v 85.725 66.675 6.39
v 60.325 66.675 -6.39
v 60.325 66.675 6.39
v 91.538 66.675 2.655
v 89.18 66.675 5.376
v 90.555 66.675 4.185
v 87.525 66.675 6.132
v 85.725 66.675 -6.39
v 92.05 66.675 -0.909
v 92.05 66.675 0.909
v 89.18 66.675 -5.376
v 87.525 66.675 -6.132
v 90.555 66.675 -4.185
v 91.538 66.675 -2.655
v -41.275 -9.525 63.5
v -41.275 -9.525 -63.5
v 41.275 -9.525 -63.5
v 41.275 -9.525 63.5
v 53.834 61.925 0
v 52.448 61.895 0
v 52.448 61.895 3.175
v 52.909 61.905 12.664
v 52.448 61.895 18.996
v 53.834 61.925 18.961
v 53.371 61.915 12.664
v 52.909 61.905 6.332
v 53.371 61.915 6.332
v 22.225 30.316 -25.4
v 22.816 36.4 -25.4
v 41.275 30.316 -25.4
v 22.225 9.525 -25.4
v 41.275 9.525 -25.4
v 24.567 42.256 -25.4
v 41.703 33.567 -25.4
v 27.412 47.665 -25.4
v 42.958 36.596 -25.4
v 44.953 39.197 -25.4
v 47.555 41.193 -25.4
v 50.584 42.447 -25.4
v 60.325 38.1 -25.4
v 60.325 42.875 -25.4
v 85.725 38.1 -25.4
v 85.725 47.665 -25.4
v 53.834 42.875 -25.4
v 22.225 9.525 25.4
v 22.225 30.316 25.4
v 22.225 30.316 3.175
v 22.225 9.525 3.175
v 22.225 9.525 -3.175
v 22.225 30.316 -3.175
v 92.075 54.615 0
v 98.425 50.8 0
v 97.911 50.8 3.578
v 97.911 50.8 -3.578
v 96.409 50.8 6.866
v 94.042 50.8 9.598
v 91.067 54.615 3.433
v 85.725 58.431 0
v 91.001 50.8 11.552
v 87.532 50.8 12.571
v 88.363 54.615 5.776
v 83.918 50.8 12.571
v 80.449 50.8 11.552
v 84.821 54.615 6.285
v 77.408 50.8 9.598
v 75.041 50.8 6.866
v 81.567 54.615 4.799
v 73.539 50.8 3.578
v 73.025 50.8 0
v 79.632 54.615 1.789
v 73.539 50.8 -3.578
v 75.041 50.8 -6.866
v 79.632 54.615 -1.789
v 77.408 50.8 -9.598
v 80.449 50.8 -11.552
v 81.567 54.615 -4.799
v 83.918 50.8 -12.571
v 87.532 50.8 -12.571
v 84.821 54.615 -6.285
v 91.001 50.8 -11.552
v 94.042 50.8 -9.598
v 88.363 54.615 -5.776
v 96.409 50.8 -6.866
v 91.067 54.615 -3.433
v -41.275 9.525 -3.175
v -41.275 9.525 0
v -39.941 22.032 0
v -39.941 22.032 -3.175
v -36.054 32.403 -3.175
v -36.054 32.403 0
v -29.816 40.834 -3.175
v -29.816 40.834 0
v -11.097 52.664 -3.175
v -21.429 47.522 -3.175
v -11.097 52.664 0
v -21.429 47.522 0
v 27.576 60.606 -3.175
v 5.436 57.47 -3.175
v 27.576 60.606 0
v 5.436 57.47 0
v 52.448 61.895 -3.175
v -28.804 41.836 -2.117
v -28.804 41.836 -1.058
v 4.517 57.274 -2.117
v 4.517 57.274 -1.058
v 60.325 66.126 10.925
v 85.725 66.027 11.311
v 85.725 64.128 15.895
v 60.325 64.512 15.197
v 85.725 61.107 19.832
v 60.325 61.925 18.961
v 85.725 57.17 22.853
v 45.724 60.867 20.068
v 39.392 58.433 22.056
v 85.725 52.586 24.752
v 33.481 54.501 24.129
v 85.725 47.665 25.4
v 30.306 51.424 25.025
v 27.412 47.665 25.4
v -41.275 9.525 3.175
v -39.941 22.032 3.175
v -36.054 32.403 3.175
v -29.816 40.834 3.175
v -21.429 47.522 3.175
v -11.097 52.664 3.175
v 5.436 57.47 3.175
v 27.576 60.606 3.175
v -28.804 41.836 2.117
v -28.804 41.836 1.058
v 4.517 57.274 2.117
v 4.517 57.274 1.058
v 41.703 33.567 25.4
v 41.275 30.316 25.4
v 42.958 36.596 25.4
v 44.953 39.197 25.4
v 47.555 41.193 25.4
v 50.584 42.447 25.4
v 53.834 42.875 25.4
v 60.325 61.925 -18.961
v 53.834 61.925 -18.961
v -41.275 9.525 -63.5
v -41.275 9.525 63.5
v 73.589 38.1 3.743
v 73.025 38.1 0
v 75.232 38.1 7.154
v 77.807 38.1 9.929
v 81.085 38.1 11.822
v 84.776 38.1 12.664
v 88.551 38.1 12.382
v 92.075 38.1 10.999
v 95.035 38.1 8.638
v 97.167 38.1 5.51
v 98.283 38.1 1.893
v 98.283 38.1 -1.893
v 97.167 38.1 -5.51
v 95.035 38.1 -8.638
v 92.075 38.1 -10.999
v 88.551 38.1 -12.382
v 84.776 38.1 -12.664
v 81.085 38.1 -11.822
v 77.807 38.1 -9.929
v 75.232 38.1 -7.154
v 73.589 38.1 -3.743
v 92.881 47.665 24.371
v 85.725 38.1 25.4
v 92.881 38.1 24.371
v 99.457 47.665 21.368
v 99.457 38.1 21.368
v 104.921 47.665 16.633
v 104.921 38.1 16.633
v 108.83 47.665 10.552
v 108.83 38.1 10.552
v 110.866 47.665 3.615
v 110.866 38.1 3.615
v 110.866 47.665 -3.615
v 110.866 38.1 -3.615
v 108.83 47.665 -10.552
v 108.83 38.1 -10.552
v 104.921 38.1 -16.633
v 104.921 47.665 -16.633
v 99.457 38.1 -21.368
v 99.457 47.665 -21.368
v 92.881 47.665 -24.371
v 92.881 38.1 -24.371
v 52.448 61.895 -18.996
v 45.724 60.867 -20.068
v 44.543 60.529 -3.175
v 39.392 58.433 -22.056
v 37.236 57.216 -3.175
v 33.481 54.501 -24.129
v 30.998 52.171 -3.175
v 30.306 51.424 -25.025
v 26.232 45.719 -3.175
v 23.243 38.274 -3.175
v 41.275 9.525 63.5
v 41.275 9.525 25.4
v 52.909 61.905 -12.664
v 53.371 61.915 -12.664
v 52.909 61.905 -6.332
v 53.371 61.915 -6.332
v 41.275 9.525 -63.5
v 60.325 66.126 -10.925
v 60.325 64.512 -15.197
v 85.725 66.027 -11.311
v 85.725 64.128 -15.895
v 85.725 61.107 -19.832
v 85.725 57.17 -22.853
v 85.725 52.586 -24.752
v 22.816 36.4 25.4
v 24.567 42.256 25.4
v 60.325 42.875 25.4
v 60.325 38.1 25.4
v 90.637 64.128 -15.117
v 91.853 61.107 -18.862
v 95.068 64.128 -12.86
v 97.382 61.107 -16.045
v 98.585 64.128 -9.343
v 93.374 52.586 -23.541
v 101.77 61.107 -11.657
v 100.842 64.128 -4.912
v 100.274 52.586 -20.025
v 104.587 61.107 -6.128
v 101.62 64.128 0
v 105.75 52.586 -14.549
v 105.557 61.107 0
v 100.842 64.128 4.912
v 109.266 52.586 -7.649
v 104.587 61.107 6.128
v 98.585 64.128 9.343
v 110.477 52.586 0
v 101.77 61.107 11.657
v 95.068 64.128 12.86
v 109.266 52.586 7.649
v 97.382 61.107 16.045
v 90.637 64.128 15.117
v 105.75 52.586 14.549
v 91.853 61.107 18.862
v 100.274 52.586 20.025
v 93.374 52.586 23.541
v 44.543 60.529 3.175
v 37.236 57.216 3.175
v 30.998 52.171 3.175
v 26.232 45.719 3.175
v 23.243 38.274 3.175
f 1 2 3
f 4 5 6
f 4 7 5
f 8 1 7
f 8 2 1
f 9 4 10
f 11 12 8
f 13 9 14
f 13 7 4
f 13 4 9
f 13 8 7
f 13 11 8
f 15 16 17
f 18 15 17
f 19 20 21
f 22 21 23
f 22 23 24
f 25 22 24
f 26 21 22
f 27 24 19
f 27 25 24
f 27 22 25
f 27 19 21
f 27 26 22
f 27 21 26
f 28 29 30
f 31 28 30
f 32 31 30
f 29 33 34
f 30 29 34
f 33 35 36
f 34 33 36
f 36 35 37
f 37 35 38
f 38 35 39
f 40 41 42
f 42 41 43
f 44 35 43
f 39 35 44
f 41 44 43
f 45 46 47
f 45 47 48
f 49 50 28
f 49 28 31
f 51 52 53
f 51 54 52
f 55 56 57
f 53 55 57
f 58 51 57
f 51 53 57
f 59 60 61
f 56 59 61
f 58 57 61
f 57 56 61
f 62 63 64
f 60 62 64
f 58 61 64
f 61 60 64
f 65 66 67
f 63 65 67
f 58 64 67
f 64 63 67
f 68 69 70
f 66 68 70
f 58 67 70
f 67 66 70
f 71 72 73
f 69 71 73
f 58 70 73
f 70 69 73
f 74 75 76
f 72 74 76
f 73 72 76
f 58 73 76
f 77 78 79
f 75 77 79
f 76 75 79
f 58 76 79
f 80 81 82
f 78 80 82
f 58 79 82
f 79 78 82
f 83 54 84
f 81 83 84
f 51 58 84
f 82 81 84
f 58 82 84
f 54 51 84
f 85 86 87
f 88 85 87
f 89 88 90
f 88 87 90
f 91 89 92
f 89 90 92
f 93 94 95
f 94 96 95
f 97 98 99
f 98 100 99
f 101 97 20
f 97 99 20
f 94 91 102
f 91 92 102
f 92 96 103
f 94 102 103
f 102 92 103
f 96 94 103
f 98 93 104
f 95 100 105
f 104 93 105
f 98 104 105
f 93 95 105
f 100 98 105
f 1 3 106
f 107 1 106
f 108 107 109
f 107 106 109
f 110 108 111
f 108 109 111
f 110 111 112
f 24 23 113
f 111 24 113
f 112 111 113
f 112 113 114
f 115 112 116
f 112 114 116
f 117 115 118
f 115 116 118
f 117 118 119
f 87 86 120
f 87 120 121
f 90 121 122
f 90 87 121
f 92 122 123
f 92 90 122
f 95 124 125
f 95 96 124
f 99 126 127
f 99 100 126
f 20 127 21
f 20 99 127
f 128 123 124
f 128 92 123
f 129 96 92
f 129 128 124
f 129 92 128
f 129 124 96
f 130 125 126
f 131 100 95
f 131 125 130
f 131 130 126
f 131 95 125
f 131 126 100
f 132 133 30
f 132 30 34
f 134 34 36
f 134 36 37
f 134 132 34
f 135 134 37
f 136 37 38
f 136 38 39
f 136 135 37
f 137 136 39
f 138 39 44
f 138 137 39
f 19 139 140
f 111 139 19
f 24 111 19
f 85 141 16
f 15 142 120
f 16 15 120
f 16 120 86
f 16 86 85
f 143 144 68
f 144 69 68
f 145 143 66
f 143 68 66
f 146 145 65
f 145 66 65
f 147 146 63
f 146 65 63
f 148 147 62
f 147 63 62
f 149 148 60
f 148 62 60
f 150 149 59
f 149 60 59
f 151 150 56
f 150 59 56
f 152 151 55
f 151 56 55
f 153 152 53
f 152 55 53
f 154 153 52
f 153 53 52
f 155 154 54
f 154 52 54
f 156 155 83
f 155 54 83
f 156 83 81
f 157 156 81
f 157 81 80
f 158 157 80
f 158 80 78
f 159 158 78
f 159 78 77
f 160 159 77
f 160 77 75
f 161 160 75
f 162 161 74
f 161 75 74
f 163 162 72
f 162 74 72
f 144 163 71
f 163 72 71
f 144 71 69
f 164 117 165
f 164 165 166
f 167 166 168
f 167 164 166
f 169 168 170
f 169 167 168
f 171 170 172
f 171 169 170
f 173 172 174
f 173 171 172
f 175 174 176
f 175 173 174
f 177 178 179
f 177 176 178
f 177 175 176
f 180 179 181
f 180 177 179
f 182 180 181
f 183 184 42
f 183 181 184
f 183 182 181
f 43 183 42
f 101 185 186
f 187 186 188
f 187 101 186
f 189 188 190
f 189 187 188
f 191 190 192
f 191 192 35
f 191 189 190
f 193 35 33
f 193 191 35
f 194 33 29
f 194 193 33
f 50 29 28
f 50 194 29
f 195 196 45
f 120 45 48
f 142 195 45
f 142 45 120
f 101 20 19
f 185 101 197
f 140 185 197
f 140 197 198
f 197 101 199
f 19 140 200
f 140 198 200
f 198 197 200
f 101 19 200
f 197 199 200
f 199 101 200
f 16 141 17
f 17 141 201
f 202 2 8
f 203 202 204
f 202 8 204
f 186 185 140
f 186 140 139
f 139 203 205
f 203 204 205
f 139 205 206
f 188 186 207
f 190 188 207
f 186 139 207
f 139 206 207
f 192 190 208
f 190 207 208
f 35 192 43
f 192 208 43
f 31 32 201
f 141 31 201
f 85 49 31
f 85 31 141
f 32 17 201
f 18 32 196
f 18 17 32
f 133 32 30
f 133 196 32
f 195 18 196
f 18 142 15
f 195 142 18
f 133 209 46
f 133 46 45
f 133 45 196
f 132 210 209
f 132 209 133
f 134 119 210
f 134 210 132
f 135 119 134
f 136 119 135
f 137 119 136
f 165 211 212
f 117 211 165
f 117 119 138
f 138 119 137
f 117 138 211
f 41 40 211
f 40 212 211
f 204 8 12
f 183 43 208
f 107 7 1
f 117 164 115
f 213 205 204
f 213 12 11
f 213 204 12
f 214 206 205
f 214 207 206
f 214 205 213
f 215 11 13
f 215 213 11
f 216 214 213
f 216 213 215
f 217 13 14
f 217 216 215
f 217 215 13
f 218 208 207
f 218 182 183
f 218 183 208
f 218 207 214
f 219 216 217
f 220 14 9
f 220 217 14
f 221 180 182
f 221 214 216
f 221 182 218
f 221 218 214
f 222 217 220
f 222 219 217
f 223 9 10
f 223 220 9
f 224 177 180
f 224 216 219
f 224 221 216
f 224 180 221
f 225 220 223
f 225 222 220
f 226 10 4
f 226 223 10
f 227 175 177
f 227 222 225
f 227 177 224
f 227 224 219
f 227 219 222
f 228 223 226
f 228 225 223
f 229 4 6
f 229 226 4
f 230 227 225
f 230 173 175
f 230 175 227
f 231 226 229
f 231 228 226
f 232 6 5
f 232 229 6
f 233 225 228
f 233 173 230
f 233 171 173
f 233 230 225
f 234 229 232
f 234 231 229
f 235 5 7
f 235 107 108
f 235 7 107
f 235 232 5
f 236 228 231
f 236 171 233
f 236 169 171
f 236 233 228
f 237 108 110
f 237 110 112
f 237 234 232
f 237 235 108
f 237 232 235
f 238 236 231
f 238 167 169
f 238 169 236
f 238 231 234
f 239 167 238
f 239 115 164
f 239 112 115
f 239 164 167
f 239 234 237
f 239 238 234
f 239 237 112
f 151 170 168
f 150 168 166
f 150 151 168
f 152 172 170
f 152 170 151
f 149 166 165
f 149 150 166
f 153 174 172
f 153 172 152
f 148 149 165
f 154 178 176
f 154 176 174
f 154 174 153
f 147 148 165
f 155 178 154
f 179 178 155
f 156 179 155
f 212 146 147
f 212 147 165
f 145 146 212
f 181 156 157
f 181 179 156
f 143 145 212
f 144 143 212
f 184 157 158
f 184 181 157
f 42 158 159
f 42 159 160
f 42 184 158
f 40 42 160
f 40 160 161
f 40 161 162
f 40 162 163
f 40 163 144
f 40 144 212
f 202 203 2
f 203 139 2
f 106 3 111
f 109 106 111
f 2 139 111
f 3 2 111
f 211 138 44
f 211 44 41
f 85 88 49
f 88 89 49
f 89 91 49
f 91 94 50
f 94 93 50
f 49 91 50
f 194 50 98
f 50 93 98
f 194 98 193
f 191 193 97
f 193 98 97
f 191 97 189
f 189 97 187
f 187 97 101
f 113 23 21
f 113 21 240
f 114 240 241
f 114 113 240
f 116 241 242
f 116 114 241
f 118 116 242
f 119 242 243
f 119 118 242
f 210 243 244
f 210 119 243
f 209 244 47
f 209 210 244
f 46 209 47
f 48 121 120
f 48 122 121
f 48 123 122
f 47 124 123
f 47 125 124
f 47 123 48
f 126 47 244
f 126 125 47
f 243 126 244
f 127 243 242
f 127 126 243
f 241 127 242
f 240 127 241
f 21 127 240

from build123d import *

# Parameters (mm, degrees)
F1_DEPTH = 63.5
F0_W     = 25.4
F0_H     = 19.05
F0_H_2   = 4.7498
F0_H_3   = 4.7752
F2_DEPTH = 25.4
F3_DEPTH = 3.175
F5_R     = 19.0095175901
F7_D     = 25.4
F7_DEPTH = 12.7
F7_TIP   = 7.6309298617


with BuildPart() as f1:
    # F0 (on Top) → F1 (new body, symmetric)
    with BuildSketch(Plane.XY):
        Polygon((41.275, -9.525), (41.275, 9.525), (22.225, 9.525), (-41.275, 9.525), (-41.275, -9.525), align=None)
    extrude(amount=F1_DEPTH, both=True)

    # F0 (on Top) → F2 (join, symmetric)
    with BuildSketch(Plane.XY):
        with BuildLine():
            Line((22.225, 9.525), (41.275, 9.525))
            Line((41.275, 9.525), (41.275, 30.3160412997))
            ThreePointArc((41.275, 30.3160412997), (44.9534924173, 39.1967075827), (53.8341587003, 42.8752))
            Line((53.8341587003, 42.8752), (60.325, 42.8752))
            Line((60.325, 42.8752), (60.325, 61.9252))
            Line((60.325, 61.9252), (53.8341587003, 61.9252))
            add(Edge.make_bspline(
                [(52.4478102945, 61.8947833874), (52.9089875046, 61.9054541447), (53.3711097525, 61.9155870845), (53.8341587003, 61.9252)],
                knots=[107.6548099731, 107.6548099731, 107.6548099731, 107.6548099731, 108.5888255242, 108.5888255242, 108.5888255242, 108.5888255242], degree=3))
            ThreePointArc((52.4478102945, 61.8947833874), (30.9982196949, 52.1714480331), (22.225, 30.3160412997))
            Line((22.225, 30.3160412997), (22.225, 9.525))
        make_face()
        with Locations((73.025, 52.4002)):
            Rectangle(F0_W, F0_H)
        with Locations((73.025, 64.3001)):
            Rectangle(F0_W, F0_H_2)
        with Locations((73.025, 40.4876)):
            Rectangle(F0_W, F0_H_3)
    extrude(amount=F2_DEPTH, both=True)

    # F0 (on Top) → F3 (join, symmetric)
    with BuildSketch(Plane.XY):
        with BuildLine():
            Line((-41.275, 9.525), (22.225, 9.525))
            Line((22.225, 9.525), (22.225, 30.3160412997))
            ThreePointArc((22.225, 30.3160412997), (30.9982196949, 52.1714480331), (52.4478102945, 61.8947833874))
            add(Edge.make_bspline(
                [(-41.275, 9.525), (-41.3081932608, 52.2900973959), (-0.7075626129, 60.6648698646), (52.4478102945, 61.8947833874)],
                knots=[0, 0, 0, 0, 107.6548099731, 107.6548099731, 107.6548099731, 107.6548099731], degree=3))
        make_face()
    extrude(amount=F3_DEPTH, both=True)

    # F0 (on Top) → F4 (revolve)
    with BuildSketch(Plane.XY):
        Polygon((85.725, 61.9252), (85.725, 42.8752), (85.725, 38.1), (111.125, 38.1), (111.125, 66.675), (85.725, 66.675), align=None)
    revolve(axis=Axis((85.725, 52.3875, 0), (0, 1, 0)))

    # F5
    f5_edges = [f1.edges().sort_by_distance(p)[0] for p in [
        (111.125, 66.675, 0),
    ]]
    fillet(f5_edges, radius=F5_R)

    # F7
    with Locations(Plane.XZ.offset(-38.1)):
        with Locations((85.725, 0)):
            Hole(F7_D / 2, depth=F7_DEPTH)
            with Locations((0, 0, -(F7_DEPTH + F7_TIP / 2))):  # 118° drill point
                Cone(0, F7_D / 2, F7_TIP, mode=Mode.SUBTRACT)


solid = f1.part
